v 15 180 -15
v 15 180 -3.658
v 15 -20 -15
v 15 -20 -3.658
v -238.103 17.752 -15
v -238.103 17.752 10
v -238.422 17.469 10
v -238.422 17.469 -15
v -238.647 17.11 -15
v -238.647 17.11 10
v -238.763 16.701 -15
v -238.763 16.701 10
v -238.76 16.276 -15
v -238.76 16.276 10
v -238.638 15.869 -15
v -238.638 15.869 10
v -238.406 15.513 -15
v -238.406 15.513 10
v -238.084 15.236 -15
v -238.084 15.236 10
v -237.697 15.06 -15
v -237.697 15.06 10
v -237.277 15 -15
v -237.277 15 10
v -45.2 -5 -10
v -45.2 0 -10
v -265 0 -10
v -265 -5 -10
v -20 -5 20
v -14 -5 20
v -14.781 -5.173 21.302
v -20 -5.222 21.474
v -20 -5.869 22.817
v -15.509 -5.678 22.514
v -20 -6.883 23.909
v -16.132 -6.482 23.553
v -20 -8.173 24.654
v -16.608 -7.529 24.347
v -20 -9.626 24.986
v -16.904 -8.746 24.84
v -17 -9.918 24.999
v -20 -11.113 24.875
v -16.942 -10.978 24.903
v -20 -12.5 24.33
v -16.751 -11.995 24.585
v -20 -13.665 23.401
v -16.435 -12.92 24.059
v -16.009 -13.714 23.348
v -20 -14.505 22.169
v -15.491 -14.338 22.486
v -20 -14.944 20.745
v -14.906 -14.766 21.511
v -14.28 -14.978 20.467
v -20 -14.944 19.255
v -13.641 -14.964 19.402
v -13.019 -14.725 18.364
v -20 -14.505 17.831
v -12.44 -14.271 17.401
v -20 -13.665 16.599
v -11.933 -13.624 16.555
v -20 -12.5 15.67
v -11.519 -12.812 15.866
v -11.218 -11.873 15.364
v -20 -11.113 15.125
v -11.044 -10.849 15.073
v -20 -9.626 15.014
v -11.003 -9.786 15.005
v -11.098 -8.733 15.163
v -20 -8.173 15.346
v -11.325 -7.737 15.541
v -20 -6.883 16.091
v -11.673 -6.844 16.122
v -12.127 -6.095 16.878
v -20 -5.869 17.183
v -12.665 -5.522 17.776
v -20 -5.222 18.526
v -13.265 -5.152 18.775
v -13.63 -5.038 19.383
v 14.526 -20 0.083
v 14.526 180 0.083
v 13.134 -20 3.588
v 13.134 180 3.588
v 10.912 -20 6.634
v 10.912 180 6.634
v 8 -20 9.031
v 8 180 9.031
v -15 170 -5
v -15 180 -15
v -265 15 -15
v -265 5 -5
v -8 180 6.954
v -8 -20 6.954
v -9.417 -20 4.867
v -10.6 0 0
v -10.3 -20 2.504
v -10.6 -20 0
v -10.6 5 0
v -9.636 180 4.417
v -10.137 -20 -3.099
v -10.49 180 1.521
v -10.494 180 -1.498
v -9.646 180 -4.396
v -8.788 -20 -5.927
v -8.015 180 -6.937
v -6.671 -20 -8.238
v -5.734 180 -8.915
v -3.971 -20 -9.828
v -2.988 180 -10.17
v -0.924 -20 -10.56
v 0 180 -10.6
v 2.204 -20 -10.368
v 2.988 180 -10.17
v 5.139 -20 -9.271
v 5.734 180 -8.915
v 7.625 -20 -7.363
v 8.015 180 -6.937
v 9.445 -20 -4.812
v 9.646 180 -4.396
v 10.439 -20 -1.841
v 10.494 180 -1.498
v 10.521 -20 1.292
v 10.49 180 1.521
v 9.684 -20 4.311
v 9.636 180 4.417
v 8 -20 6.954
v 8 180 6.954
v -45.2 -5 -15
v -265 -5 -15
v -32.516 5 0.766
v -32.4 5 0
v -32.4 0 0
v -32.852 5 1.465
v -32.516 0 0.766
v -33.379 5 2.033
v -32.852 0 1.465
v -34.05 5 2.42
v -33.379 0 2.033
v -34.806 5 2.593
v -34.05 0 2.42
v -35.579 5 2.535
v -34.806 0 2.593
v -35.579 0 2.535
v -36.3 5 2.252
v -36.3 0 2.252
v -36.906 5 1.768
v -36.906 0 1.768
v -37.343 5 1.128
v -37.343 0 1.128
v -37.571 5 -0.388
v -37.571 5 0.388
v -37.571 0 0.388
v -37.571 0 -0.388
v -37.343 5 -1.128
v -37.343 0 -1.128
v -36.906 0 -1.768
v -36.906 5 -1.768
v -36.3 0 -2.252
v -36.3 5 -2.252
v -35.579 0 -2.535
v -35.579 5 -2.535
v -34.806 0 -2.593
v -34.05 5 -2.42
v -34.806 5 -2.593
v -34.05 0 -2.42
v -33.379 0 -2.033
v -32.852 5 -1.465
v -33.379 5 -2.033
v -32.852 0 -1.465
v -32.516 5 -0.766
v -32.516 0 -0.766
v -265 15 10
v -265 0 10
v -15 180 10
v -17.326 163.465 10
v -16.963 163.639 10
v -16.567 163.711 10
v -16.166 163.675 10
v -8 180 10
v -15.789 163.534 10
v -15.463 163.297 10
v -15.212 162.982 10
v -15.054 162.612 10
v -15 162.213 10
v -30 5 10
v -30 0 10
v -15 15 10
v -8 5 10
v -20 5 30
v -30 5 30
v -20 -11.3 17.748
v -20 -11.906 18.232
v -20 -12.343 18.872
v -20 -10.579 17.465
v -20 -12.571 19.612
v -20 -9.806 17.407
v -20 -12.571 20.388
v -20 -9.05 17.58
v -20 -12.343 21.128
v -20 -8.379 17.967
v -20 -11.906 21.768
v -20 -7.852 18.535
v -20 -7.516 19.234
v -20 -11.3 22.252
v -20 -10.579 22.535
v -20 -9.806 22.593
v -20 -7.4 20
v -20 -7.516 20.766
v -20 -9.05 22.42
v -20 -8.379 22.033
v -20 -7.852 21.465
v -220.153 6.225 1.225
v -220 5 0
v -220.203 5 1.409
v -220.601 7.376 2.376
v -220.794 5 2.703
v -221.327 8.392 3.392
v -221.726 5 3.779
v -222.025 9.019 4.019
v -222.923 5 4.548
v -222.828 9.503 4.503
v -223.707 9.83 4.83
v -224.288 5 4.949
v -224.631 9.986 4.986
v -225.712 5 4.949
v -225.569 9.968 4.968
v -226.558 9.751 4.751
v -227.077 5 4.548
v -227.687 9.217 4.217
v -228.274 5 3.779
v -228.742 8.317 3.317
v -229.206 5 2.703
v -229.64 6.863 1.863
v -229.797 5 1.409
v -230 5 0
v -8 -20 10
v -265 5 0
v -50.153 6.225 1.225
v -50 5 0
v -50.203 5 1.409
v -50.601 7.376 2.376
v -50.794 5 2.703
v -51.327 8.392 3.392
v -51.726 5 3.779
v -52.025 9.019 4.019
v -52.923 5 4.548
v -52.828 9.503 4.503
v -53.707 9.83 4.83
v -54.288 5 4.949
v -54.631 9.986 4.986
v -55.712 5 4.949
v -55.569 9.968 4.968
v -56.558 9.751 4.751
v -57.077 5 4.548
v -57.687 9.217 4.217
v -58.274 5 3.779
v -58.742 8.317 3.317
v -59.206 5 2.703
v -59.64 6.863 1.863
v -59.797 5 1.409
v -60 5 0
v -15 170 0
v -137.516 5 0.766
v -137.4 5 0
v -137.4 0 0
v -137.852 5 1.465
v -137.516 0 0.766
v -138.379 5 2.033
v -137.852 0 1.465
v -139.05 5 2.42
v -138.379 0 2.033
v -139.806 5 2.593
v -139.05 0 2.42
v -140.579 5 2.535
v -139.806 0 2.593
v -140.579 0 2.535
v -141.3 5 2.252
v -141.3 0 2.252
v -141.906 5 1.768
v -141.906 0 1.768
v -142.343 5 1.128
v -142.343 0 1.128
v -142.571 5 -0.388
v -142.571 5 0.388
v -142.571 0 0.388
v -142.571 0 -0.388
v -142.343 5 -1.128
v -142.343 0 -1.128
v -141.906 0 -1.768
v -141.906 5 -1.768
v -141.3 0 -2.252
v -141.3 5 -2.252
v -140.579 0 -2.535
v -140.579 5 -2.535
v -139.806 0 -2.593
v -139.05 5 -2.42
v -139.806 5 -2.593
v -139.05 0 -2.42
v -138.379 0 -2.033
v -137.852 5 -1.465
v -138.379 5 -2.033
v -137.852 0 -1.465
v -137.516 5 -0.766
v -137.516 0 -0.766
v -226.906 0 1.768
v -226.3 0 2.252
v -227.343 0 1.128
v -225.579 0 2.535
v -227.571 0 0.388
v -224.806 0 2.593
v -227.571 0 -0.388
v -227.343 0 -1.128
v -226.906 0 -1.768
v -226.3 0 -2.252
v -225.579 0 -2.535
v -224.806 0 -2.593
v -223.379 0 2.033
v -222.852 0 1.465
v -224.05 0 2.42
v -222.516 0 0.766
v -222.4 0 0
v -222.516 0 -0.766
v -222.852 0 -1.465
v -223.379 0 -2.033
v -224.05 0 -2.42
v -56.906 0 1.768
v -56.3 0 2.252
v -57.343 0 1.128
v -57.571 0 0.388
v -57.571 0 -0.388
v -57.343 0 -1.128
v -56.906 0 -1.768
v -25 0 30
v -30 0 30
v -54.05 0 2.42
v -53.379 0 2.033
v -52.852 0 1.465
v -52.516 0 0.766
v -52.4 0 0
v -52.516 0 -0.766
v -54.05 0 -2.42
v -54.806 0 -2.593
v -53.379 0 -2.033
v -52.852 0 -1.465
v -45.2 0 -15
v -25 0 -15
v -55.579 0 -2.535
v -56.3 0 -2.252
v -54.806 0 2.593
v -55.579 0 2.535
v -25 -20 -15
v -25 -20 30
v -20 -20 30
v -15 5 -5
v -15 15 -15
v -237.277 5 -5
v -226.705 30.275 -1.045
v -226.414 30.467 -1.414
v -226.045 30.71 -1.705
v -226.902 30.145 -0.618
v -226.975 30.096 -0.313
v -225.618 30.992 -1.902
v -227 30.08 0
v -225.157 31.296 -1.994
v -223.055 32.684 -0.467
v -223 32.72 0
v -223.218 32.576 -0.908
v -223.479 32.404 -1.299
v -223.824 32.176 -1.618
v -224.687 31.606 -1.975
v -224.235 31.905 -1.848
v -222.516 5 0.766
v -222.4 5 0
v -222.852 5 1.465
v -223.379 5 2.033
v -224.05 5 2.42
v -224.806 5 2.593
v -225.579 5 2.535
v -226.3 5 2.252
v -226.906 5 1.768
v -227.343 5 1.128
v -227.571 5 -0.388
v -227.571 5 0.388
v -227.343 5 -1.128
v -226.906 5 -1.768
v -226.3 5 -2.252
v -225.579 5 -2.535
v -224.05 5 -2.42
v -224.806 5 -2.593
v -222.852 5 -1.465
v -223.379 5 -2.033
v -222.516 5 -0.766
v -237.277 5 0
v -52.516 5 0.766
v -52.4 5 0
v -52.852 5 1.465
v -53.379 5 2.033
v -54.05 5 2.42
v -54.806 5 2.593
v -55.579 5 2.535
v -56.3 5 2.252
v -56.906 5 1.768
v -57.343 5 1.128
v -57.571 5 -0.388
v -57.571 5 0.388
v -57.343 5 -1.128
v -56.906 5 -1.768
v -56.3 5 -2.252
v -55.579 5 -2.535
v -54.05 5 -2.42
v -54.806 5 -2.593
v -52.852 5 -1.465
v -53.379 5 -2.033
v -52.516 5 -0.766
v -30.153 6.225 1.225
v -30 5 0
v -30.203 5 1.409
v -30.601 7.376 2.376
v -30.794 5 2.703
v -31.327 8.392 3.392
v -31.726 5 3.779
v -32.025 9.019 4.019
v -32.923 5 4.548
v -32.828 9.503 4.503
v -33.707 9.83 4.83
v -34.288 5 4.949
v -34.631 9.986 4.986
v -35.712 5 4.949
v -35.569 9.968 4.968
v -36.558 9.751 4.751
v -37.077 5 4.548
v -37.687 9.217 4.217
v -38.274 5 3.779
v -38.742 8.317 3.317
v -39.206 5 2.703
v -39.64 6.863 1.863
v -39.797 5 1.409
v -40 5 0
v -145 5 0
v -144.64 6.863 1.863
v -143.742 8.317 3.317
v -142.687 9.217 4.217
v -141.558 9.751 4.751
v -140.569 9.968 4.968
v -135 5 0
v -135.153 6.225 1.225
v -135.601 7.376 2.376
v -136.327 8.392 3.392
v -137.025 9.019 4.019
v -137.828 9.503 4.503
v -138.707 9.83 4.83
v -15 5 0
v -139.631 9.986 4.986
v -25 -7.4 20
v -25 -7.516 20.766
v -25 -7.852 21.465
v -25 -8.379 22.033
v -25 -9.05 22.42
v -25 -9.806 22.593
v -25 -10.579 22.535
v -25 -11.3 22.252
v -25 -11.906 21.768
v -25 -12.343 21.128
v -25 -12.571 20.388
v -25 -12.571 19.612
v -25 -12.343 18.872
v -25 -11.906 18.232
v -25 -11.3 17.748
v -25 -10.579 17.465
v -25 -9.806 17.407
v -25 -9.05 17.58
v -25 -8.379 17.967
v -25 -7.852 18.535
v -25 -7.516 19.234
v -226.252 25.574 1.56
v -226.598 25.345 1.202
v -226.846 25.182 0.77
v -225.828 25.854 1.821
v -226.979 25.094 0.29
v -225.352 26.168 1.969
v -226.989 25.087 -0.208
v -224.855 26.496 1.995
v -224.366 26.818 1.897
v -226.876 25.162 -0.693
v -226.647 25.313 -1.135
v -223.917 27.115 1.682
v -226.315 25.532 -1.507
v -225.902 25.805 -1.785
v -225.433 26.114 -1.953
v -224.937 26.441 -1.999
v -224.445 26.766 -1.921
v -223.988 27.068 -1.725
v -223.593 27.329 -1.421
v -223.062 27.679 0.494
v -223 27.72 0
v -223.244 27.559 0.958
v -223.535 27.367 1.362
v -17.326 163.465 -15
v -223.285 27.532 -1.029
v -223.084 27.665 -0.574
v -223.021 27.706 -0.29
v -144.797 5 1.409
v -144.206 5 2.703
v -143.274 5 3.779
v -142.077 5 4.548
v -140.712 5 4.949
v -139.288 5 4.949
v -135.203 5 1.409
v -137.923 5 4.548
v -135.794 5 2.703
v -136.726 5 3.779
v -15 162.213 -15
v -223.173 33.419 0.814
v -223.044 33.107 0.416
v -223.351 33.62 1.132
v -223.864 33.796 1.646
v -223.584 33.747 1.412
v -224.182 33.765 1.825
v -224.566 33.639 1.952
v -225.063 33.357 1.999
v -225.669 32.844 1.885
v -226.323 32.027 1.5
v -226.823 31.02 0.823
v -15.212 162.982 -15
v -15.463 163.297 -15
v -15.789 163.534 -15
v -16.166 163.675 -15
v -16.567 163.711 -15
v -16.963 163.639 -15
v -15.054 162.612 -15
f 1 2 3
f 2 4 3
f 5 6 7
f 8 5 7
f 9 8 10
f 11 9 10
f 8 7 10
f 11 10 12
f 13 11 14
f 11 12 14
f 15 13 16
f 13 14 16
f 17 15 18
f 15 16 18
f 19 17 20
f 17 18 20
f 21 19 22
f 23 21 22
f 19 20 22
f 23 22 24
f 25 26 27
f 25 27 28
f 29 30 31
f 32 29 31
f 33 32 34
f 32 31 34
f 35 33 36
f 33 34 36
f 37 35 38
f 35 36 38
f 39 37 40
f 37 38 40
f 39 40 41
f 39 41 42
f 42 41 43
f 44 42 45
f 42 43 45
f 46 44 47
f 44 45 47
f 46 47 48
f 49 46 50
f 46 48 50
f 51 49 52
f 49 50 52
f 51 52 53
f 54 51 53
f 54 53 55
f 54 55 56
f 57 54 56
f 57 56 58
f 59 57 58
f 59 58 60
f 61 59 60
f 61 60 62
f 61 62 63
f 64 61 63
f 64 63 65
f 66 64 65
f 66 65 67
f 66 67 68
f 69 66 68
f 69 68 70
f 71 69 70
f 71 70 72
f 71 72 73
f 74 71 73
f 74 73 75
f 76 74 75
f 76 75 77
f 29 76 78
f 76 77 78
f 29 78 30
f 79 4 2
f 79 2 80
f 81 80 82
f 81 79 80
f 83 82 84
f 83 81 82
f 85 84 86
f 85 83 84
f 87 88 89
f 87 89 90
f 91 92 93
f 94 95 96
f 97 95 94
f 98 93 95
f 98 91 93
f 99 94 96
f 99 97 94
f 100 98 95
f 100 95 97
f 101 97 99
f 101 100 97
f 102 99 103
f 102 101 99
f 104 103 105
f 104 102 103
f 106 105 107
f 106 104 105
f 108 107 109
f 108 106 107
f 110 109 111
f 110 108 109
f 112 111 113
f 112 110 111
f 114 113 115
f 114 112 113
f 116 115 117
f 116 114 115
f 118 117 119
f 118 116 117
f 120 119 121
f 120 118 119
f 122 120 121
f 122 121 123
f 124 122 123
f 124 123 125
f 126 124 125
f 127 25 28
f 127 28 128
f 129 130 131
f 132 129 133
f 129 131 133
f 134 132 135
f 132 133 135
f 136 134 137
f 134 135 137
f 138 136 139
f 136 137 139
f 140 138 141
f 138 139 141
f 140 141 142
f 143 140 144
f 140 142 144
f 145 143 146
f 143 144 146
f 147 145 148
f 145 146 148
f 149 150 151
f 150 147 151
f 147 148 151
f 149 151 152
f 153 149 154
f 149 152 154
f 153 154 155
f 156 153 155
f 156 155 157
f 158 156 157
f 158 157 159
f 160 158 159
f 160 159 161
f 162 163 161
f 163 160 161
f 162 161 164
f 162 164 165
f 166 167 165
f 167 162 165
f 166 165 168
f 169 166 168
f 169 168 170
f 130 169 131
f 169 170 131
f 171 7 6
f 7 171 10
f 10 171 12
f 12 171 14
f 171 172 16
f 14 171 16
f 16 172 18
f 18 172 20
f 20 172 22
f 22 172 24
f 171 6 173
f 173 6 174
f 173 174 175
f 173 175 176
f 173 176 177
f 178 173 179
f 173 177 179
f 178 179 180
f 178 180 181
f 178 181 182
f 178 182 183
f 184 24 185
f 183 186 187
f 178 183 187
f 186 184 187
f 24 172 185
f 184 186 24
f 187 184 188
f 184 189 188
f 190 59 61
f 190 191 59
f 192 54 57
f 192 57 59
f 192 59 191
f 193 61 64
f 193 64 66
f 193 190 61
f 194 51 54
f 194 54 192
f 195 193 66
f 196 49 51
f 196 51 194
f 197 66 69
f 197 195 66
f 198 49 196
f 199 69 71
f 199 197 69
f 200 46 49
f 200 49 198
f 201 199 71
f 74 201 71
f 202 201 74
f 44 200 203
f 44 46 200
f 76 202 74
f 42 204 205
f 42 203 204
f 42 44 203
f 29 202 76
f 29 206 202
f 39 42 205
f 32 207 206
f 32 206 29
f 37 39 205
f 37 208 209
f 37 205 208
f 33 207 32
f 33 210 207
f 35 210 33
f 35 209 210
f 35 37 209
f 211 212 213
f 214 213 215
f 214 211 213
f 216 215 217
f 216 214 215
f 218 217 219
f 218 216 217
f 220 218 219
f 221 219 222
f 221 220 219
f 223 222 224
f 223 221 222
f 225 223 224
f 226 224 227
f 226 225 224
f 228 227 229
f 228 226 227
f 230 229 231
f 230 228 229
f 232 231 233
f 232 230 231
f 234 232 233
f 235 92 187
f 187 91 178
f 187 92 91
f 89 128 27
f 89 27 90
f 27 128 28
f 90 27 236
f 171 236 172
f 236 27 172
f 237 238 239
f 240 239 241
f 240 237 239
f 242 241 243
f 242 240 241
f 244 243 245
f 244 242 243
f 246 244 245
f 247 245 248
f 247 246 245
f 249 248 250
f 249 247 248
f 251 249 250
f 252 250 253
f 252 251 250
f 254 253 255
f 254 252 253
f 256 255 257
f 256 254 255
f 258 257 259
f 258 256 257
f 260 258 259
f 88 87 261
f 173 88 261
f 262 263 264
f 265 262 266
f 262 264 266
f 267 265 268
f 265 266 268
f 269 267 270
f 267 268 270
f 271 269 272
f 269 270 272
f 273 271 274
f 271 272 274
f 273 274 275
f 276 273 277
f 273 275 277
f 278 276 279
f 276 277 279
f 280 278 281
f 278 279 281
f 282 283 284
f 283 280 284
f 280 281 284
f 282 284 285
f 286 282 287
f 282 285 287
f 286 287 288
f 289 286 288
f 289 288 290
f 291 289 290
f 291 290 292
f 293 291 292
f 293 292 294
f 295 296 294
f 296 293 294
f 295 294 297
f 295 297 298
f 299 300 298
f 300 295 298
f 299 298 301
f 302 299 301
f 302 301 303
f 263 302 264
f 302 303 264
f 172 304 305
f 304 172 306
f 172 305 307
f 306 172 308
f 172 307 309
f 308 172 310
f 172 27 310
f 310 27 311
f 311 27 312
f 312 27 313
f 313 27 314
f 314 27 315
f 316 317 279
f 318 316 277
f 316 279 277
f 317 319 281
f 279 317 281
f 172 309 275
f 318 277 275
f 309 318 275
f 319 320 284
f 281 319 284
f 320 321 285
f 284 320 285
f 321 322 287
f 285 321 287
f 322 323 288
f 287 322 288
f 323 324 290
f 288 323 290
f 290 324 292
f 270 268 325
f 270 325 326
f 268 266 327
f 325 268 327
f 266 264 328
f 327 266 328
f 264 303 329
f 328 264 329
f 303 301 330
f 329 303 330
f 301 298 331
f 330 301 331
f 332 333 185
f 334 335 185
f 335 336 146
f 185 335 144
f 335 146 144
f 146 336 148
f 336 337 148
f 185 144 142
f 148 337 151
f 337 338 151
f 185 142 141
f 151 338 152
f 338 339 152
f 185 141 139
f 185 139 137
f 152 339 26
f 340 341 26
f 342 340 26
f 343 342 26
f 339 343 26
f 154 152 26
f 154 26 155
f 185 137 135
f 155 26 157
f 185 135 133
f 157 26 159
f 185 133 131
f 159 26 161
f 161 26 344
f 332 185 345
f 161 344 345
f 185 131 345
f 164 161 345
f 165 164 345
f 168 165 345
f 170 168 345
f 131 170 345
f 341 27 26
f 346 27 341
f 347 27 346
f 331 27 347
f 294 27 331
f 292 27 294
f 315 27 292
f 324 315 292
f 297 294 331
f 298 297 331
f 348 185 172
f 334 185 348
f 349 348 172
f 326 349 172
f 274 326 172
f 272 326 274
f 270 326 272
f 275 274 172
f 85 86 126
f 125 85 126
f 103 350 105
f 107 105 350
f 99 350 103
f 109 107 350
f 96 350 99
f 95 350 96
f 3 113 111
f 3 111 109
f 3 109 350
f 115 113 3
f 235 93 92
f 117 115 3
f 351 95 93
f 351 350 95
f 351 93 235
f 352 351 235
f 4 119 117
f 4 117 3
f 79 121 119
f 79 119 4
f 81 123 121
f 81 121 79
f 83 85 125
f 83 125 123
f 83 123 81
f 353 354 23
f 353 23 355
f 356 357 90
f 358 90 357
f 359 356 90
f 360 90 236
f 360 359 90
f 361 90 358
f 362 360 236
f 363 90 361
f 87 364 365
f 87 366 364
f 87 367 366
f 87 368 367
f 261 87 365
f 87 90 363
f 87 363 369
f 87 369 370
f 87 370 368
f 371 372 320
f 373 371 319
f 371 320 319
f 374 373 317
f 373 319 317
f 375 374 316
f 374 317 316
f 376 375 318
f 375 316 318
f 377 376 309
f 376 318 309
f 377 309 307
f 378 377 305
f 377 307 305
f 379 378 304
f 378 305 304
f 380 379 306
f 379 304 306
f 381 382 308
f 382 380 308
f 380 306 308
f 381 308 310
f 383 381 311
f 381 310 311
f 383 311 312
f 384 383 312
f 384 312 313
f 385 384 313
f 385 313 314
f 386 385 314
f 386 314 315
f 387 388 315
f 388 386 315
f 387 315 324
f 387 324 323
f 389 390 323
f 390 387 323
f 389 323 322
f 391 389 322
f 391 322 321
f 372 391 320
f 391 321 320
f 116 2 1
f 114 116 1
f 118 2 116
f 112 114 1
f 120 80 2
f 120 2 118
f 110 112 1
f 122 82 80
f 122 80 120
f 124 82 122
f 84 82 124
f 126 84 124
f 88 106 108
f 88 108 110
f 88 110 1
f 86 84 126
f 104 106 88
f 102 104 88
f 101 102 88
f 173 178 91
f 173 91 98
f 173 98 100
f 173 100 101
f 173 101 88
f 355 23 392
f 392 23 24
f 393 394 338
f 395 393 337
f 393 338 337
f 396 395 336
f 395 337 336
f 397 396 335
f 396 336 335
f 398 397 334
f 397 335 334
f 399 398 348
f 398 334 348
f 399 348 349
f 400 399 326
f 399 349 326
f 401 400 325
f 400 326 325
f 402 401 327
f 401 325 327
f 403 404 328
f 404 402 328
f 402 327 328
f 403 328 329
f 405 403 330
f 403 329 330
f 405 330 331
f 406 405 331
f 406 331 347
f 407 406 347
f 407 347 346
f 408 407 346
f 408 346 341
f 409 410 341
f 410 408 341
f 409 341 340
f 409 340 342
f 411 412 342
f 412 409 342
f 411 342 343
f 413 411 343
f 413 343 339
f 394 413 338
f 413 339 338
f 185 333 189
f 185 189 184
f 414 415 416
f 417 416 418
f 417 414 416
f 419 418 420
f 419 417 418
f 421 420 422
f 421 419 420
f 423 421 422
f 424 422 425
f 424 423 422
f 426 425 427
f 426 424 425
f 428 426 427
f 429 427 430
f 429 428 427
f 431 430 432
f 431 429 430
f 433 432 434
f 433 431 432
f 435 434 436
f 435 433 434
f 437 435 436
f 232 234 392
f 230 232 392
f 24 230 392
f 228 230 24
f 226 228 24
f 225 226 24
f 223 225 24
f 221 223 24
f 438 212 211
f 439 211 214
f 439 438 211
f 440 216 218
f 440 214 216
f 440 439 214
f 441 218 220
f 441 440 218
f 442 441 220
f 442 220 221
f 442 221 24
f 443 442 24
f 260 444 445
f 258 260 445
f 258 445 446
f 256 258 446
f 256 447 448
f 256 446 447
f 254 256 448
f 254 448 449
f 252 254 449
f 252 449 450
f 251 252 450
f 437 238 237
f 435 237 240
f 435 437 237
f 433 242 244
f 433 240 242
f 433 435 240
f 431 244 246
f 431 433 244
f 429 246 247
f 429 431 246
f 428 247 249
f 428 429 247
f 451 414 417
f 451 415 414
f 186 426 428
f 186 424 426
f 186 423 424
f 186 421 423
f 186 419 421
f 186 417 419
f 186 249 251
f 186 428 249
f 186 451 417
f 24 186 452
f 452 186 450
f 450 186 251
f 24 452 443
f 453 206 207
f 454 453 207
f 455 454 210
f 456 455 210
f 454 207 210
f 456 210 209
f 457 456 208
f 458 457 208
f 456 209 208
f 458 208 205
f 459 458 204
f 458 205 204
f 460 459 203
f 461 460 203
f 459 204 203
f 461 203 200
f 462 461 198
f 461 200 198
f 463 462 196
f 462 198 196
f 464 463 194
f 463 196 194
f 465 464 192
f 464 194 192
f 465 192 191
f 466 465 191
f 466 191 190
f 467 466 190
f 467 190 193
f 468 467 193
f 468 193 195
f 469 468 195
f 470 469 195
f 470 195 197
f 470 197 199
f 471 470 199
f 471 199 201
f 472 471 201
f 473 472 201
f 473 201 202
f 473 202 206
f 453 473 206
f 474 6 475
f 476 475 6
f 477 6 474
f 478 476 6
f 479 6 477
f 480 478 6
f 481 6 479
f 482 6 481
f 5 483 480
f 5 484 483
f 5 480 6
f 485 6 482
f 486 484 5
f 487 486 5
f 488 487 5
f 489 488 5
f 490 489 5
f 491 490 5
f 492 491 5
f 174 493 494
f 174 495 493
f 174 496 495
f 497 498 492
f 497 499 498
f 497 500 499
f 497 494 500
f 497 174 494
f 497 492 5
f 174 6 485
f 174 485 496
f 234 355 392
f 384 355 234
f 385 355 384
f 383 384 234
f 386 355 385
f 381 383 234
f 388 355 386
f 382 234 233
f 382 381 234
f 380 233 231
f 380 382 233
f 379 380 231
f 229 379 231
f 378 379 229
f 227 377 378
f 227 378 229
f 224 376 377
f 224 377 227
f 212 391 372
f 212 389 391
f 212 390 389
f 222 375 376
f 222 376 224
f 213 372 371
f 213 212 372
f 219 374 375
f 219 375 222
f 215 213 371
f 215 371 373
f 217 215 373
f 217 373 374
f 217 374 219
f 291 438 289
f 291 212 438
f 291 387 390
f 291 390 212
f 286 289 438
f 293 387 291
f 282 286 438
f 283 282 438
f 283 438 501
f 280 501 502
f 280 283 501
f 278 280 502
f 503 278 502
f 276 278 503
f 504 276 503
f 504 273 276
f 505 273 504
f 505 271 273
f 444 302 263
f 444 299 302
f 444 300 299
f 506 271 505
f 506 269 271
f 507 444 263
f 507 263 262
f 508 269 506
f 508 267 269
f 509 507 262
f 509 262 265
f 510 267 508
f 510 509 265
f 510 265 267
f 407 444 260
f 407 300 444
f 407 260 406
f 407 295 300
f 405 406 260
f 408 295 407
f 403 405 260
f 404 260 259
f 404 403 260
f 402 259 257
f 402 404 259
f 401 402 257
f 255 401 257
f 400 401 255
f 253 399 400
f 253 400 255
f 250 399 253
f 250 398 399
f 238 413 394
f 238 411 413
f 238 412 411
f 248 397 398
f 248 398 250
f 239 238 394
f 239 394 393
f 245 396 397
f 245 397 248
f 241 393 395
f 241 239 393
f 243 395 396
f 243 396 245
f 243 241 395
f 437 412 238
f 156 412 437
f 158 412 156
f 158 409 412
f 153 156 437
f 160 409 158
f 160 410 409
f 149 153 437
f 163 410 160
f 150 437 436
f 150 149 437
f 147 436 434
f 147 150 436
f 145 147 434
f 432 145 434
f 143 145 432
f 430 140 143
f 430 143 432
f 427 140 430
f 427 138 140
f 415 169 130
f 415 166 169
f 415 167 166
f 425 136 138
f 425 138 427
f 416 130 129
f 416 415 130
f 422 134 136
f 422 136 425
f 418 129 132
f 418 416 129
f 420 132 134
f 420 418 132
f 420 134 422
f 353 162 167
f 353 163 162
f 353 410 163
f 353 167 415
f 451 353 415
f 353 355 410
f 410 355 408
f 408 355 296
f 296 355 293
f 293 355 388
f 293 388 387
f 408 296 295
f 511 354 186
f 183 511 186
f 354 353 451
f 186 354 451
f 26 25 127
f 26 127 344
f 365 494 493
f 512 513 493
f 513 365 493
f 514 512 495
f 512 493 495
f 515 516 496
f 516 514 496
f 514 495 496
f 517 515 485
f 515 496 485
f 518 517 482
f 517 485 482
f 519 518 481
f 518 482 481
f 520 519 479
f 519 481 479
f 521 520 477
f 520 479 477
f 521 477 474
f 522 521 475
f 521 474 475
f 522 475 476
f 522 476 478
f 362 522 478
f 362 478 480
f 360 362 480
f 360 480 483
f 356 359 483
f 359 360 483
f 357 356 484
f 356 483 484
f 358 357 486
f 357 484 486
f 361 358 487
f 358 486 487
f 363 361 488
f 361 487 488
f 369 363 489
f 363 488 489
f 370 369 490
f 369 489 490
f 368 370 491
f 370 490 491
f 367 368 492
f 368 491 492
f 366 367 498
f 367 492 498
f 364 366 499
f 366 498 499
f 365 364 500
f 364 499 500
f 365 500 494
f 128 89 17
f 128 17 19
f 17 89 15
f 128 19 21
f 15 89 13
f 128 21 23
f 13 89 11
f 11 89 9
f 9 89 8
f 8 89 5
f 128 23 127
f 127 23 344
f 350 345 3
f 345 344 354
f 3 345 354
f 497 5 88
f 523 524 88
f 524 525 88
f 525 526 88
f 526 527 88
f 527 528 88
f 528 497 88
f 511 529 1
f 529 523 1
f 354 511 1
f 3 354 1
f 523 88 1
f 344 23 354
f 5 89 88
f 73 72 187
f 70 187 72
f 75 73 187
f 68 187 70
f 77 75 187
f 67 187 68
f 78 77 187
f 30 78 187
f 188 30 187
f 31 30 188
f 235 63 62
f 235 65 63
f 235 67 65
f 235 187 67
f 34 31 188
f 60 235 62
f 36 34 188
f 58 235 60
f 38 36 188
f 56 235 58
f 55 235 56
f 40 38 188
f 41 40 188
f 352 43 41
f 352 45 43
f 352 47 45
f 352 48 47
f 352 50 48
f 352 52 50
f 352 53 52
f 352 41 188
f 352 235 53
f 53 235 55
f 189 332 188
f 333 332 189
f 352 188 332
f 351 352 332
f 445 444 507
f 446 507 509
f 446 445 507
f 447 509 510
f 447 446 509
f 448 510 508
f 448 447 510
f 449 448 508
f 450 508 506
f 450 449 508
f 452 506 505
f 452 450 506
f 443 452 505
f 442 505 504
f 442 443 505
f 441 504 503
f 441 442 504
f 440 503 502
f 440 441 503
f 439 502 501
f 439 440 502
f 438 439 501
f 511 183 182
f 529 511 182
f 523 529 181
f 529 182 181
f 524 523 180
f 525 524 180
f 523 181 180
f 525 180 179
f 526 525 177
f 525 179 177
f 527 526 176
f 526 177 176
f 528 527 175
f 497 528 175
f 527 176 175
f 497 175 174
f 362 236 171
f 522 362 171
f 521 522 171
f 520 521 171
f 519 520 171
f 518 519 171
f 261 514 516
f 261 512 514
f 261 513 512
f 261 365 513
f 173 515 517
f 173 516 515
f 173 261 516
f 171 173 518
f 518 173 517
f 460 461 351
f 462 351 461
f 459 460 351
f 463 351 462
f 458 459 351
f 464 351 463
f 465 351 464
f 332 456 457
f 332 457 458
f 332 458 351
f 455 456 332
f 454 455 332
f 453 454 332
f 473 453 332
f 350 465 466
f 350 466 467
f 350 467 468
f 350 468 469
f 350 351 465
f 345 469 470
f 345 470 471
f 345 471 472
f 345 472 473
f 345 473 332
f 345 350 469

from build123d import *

# Parameters (mm, degrees)
PAD_DEPTH            = 20
PAD_DEPTH_BACK       = 180
PAD001_DEPTH         = 25
POCKET_DEPTH         = 180.001
POCKET_DEPTH_BACK    = 20.001
PAD002_DEPTH         = 20
PAD002_DEPTH_BACK    = 5
SKETCH008_W          = 20.2
SKETCH008_H          = 20.2
POCKET001_DEPTH      = 15.001
POCKET001_DEPTH_BACK = 30.001
SKETCH009_R          = 2.6
POCKET002_DEPTH      = 5
SKETCH010_R          = 5
POCKET003_DEPTH      = 10
SKETCH011_R          = 2.6
POCKET004_DEPTH      = 265.001
SKETCH012_R          = 5
POCKET005_DEPTH      = 20
SKETCH013_R          = 2
POCKET006_DEPTH      = 180.001


with BuildPart() as part:
    # Sketch → Pad (new body, two sides)
    with BuildSketch(Plane.XZ) as pad_sk:
        with BuildLine():
            Line((-15, 10), (3.201562, 10))
            Line((3.201562, 10), (6.201562, 10))
            ThreePointArc((15, -3.65795), (12.609975, 4.465345), (6.201562, 10))
            Line((15, -3.65795), (15, -15))
            Line((15, -15), (-15, -15))
            Line((-15, -15), (-15, 10))
        make_face()
    extrude(amount=PAD_DEPTH)
    extrude(pad_sk.sketch, amount=-PAD_DEPTH_BACK)

    # AdditivePipe: sweep along a path in Sketch001
    with BuildLine(Plane.XY) as additivepipe_path:
        Line((-265, 0), (0, 0))
    # Sketch002 (on DatumPlane) → AdditivePipe (sweep)
    with BuildSketch(Plane.YZ.offset(-265)):
        Polygon((0, -10), (0, 10), (15, 10), (5, 0), (5, -5), (15, -15), (-5, -15), (-5, -10), align=None)
    sweep(path=additivepipe_path.line, is_frenet=True)

    # AdditivePipe001: sweep along a path in Sketch004
    with BuildLine(Plane.XY) as additivepipe001_path:
        Line((-265, 0), (-15, 165))
    # Sketch003 (on DatumPlane) → AdditivePipe001 (sweep)
    with BuildSketch(Plane.YZ.offset(-265)):
        Polygon((0, 10), (0, -15), (15, -15), (5, -5), (5, 0), (15, 10), align=None)
    sweep(path=additivepipe001_path.line, is_frenet=True)

    # Sketch005 (on Face19 of AdditivePipe001) → Pad001 (join)
    with BuildSketch(Plane(origin=(0, 0, 10), x_dir=(-1, 0, 0), z_dir=(0, 0, 1))):
        with BuildLine():
            ThreePointArc((238.103146, -17.751924), (238.71354, -16.068657), (237.276897, -15))
            Line((237.276897, -15), (237.276897, -5))
            Line((237.276897, -5), (257.424242, -5))
            Line((257.424242, -5), (257.424242, -10))
            Line((257.424242, -10), (241.155013, -20.737691))
            Line((241.155013, -20.737691), (238.103146, -17.751924))
        make_face()
        with BuildLine():
            ThreePointArc((15, -162.212752), (15.789148, -163.533619), (17.326253, -163.464673))
            Line((17.326253, -163.464673), (19.815663, -166.821662))
            Line((19.815663, -166.821662), (12.527544, -171.631821))
            Line((12.527544, -162.212752), (12.527544, -171.631821))
            Line((15, -162.212752), (12.527544, -162.212752))
        make_face()
    extrude(amount=-PAD001_DEPTH)

    # Sketch006 → Pocket (cut, two sides)
    with BuildSketch(Plane.XZ) as pocket_sk:
        with BuildLine():
            ThreePointArc((-8, 6.954135), (0, -10.6), (8, 6.954135))
            Line((8, 22.954135), (8, 6.954135))
            Line((-8, 22.954135), (8, 22.954135))
            Line((-8, 6.954135), (-8, 22.954135))
        make_face()
    extrude(amount=-POCKET_DEPTH, mode=Mode.SUBTRACT)
    extrude(pocket_sk.sketch, amount=POCKET_DEPTH_BACK, mode=Mode.SUBTRACT)

    # Sketch007 → Pad002 (join, two sides)
    with BuildSketch(Plane.XZ) as pad002_sk:
        Polygon((-8, 10), (-20, 30), (-30, 30), (-30, -15), (-10.6, -15), (-10.6, 6.954135), (-8, 6.954135), align=None)
    extrude(amount=PAD002_DEPTH)
    extrude(pad002_sk.sketch, amount=-PAD002_DEPTH_BACK)

    # Sketch008 → Pocket001 (cut, two sides)
    with BuildSketch(Plane.XY) as pocket001_sk:
        with Locations((-35.1, -10.1)):
            Rectangle(SKETCH008_W, SKETCH008_H)
    extrude(amount=-POCKET001_DEPTH, mode=Mode.SUBTRACT)
    extrude(pocket001_sk.sketch, amount=POCKET001_DEPTH_BACK, mode=Mode.SUBTRACT)

    # Sketch009 → Pocket002 (cut)
    with BuildSketch(Plane.XZ):
        with Locations((-35, 0)):
            Circle(SKETCH009_R)
        with Locations((-55, 0)):
            Circle(SKETCH009_R)
        with Locations((-140, 0)):
            Circle(SKETCH009_R)
        with Locations((-225, 0)):
            Circle(SKETCH009_R)
    extrude(amount=-POCKET002_DEPTH, mode=Mode.SUBTRACT)

    # Sketch010 (on DatumPlane) → Pocket003 (cut)
    with BuildSketch(Plane.XZ.offset(-15)):
        with Locations((-225, 0)):
            Circle(SKETCH010_R)
        with Locations((-140, 0)):
            Circle(SKETCH010_R)
        with Locations((-55, 0)):
            Circle(SKETCH010_R)
        with Locations((-35, 0)):
            Circle(SKETCH010_R)
    extrude(amount=POCKET003_DEPTH, mode=Mode.SUBTRACT)

    # Sketch011 → Pocket004 (cut, through all)
    with BuildSketch(Plane.YZ):
        with Locations((-10, 20)):
            Circle(SKETCH011_R)
    extrude(amount=-POCKET004_DEPTH, mode=Mode.SUBTRACT)

    # Sketch012 → Pocket005 (cut)
    with BuildSketch(Plane.YZ):
        with Locations((-10, 20)):
            Circle(SKETCH012_R)
    extrude(amount=-POCKET005_DEPTH, mode=Mode.SUBTRACT)

    # Sketch013 → Pocket006 (cut, through all)
    with BuildSketch(Plane.XZ):
        with Locations((-225, 0)):
            Circle(SKETCH013_R)
    extrude(amount=-POCKET006_DEPTH, mode=Mode.SUBTRACT)


solid = part.part
